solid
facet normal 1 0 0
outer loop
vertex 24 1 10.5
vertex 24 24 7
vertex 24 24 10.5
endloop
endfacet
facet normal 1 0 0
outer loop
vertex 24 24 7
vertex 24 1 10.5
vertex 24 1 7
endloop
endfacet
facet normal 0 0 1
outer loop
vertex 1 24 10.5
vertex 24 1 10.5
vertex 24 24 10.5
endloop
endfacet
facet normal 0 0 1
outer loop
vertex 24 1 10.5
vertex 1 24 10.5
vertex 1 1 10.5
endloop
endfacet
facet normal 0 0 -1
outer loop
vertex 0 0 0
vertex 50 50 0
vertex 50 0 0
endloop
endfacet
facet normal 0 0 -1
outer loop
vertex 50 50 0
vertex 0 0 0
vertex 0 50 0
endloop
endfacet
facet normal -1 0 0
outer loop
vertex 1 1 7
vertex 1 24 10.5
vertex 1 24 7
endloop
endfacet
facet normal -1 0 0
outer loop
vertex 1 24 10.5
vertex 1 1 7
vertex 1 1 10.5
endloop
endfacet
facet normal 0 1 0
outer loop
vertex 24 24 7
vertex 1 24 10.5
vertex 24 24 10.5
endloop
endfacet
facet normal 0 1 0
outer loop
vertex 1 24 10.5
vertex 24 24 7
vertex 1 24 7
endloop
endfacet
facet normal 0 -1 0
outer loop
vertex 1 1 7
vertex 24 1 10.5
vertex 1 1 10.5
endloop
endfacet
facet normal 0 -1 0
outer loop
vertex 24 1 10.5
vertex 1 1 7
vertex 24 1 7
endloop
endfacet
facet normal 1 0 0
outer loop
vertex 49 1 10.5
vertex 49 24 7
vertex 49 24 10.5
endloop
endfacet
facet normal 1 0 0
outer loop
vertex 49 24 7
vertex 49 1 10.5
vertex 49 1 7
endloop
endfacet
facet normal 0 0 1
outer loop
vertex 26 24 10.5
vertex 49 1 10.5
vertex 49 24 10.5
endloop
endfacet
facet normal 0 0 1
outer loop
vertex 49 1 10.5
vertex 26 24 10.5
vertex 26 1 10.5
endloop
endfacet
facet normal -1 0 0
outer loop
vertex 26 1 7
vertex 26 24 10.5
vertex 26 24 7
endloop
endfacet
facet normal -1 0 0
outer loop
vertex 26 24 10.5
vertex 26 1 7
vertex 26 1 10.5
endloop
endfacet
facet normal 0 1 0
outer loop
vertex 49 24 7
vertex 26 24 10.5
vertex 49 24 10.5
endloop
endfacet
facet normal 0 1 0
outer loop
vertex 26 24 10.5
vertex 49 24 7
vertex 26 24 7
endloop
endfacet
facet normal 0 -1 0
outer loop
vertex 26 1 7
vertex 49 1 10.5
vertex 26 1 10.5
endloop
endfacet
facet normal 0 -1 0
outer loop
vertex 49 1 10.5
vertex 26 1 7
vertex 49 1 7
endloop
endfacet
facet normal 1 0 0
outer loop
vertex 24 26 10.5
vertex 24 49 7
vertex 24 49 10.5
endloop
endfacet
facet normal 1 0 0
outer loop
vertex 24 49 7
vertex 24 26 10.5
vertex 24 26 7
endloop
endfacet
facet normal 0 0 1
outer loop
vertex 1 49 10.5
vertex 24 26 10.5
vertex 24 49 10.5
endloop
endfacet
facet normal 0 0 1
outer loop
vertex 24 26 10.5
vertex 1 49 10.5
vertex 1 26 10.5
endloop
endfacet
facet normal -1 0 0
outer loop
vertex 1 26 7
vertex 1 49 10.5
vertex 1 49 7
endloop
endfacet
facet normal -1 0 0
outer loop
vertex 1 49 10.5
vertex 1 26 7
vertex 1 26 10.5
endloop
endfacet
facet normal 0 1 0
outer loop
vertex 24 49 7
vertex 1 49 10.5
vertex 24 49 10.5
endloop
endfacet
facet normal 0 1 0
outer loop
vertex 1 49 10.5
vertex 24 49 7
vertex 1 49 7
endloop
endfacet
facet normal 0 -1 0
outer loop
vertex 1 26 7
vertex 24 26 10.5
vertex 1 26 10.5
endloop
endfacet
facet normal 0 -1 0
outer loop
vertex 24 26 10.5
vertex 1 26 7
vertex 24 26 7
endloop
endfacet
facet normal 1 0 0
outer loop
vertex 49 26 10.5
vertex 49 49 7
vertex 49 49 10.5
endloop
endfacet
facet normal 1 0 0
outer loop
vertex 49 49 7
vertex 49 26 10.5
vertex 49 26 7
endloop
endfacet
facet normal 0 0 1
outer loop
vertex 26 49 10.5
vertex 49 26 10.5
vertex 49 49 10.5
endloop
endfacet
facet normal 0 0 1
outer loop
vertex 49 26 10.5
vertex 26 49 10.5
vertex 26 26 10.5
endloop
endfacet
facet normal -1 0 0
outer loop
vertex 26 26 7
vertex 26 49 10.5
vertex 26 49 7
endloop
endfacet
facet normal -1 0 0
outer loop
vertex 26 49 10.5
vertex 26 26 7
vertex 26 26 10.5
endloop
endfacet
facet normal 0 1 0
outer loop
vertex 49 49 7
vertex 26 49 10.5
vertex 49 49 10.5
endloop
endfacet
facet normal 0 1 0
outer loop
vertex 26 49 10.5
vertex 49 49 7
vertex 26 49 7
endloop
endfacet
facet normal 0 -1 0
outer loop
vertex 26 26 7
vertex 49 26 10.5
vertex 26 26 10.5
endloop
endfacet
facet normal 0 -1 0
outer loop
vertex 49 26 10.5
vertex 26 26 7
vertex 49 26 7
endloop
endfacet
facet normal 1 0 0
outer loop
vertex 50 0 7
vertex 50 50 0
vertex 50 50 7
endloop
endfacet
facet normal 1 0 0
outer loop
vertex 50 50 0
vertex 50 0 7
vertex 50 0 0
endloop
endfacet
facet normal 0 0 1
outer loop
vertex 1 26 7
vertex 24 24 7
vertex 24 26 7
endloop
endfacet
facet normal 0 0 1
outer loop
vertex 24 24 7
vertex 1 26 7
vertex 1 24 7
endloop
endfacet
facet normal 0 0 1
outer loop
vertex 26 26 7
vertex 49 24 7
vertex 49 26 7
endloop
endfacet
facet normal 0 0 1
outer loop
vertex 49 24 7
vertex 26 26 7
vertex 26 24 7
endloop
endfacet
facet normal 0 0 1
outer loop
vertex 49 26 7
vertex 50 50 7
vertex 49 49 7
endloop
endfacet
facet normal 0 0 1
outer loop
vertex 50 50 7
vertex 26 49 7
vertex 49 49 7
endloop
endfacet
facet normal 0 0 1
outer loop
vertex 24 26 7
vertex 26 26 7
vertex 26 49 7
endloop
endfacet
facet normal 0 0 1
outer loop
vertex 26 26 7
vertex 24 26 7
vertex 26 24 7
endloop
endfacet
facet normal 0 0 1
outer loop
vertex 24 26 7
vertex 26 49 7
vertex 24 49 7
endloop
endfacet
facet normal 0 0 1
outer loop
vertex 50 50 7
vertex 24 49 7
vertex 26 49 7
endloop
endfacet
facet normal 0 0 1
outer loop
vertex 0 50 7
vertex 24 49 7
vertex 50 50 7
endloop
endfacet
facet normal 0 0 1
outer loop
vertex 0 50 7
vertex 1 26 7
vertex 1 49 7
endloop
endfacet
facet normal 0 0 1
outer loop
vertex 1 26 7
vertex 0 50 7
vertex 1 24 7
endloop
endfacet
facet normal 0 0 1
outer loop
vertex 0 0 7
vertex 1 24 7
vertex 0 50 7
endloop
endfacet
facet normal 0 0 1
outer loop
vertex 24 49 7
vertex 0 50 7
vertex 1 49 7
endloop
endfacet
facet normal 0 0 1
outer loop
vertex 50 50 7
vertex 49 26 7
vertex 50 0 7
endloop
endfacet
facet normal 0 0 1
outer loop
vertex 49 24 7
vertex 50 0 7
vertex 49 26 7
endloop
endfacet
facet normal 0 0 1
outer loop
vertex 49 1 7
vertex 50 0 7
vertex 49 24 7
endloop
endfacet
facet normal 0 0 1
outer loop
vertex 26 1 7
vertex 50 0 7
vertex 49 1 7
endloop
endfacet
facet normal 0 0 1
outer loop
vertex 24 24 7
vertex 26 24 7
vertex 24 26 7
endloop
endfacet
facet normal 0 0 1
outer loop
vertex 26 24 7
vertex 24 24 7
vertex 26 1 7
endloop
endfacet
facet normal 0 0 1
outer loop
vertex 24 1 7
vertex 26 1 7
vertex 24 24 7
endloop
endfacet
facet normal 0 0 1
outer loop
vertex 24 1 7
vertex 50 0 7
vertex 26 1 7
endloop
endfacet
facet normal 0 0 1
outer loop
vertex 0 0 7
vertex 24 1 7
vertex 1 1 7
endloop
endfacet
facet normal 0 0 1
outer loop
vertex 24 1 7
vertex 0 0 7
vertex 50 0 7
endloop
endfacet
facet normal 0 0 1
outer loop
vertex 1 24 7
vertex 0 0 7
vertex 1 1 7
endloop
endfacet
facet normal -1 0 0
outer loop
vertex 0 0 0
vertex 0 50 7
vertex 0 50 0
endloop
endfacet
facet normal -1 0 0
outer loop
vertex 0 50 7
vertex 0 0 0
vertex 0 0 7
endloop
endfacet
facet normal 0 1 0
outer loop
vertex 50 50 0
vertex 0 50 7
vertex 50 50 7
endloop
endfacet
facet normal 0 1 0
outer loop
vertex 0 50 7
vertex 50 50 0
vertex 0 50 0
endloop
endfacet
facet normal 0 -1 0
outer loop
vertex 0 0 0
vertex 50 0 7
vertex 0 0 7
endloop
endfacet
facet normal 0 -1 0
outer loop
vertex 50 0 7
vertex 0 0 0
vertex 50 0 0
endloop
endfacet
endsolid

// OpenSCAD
color("LightGray") {
    translate([1,1,0]) cube([23,23,6+4.5]);
    translate([25+1,1,0]) cube([23,23,6+4.5]);
    translate([1,25+1,0]) cube([23,23,6+4.5]);
    translate([25+1,25+1,0]) cube([23,23,6+4.5]);
}
color("Grey") {
    cube([50,50,7]);
}
